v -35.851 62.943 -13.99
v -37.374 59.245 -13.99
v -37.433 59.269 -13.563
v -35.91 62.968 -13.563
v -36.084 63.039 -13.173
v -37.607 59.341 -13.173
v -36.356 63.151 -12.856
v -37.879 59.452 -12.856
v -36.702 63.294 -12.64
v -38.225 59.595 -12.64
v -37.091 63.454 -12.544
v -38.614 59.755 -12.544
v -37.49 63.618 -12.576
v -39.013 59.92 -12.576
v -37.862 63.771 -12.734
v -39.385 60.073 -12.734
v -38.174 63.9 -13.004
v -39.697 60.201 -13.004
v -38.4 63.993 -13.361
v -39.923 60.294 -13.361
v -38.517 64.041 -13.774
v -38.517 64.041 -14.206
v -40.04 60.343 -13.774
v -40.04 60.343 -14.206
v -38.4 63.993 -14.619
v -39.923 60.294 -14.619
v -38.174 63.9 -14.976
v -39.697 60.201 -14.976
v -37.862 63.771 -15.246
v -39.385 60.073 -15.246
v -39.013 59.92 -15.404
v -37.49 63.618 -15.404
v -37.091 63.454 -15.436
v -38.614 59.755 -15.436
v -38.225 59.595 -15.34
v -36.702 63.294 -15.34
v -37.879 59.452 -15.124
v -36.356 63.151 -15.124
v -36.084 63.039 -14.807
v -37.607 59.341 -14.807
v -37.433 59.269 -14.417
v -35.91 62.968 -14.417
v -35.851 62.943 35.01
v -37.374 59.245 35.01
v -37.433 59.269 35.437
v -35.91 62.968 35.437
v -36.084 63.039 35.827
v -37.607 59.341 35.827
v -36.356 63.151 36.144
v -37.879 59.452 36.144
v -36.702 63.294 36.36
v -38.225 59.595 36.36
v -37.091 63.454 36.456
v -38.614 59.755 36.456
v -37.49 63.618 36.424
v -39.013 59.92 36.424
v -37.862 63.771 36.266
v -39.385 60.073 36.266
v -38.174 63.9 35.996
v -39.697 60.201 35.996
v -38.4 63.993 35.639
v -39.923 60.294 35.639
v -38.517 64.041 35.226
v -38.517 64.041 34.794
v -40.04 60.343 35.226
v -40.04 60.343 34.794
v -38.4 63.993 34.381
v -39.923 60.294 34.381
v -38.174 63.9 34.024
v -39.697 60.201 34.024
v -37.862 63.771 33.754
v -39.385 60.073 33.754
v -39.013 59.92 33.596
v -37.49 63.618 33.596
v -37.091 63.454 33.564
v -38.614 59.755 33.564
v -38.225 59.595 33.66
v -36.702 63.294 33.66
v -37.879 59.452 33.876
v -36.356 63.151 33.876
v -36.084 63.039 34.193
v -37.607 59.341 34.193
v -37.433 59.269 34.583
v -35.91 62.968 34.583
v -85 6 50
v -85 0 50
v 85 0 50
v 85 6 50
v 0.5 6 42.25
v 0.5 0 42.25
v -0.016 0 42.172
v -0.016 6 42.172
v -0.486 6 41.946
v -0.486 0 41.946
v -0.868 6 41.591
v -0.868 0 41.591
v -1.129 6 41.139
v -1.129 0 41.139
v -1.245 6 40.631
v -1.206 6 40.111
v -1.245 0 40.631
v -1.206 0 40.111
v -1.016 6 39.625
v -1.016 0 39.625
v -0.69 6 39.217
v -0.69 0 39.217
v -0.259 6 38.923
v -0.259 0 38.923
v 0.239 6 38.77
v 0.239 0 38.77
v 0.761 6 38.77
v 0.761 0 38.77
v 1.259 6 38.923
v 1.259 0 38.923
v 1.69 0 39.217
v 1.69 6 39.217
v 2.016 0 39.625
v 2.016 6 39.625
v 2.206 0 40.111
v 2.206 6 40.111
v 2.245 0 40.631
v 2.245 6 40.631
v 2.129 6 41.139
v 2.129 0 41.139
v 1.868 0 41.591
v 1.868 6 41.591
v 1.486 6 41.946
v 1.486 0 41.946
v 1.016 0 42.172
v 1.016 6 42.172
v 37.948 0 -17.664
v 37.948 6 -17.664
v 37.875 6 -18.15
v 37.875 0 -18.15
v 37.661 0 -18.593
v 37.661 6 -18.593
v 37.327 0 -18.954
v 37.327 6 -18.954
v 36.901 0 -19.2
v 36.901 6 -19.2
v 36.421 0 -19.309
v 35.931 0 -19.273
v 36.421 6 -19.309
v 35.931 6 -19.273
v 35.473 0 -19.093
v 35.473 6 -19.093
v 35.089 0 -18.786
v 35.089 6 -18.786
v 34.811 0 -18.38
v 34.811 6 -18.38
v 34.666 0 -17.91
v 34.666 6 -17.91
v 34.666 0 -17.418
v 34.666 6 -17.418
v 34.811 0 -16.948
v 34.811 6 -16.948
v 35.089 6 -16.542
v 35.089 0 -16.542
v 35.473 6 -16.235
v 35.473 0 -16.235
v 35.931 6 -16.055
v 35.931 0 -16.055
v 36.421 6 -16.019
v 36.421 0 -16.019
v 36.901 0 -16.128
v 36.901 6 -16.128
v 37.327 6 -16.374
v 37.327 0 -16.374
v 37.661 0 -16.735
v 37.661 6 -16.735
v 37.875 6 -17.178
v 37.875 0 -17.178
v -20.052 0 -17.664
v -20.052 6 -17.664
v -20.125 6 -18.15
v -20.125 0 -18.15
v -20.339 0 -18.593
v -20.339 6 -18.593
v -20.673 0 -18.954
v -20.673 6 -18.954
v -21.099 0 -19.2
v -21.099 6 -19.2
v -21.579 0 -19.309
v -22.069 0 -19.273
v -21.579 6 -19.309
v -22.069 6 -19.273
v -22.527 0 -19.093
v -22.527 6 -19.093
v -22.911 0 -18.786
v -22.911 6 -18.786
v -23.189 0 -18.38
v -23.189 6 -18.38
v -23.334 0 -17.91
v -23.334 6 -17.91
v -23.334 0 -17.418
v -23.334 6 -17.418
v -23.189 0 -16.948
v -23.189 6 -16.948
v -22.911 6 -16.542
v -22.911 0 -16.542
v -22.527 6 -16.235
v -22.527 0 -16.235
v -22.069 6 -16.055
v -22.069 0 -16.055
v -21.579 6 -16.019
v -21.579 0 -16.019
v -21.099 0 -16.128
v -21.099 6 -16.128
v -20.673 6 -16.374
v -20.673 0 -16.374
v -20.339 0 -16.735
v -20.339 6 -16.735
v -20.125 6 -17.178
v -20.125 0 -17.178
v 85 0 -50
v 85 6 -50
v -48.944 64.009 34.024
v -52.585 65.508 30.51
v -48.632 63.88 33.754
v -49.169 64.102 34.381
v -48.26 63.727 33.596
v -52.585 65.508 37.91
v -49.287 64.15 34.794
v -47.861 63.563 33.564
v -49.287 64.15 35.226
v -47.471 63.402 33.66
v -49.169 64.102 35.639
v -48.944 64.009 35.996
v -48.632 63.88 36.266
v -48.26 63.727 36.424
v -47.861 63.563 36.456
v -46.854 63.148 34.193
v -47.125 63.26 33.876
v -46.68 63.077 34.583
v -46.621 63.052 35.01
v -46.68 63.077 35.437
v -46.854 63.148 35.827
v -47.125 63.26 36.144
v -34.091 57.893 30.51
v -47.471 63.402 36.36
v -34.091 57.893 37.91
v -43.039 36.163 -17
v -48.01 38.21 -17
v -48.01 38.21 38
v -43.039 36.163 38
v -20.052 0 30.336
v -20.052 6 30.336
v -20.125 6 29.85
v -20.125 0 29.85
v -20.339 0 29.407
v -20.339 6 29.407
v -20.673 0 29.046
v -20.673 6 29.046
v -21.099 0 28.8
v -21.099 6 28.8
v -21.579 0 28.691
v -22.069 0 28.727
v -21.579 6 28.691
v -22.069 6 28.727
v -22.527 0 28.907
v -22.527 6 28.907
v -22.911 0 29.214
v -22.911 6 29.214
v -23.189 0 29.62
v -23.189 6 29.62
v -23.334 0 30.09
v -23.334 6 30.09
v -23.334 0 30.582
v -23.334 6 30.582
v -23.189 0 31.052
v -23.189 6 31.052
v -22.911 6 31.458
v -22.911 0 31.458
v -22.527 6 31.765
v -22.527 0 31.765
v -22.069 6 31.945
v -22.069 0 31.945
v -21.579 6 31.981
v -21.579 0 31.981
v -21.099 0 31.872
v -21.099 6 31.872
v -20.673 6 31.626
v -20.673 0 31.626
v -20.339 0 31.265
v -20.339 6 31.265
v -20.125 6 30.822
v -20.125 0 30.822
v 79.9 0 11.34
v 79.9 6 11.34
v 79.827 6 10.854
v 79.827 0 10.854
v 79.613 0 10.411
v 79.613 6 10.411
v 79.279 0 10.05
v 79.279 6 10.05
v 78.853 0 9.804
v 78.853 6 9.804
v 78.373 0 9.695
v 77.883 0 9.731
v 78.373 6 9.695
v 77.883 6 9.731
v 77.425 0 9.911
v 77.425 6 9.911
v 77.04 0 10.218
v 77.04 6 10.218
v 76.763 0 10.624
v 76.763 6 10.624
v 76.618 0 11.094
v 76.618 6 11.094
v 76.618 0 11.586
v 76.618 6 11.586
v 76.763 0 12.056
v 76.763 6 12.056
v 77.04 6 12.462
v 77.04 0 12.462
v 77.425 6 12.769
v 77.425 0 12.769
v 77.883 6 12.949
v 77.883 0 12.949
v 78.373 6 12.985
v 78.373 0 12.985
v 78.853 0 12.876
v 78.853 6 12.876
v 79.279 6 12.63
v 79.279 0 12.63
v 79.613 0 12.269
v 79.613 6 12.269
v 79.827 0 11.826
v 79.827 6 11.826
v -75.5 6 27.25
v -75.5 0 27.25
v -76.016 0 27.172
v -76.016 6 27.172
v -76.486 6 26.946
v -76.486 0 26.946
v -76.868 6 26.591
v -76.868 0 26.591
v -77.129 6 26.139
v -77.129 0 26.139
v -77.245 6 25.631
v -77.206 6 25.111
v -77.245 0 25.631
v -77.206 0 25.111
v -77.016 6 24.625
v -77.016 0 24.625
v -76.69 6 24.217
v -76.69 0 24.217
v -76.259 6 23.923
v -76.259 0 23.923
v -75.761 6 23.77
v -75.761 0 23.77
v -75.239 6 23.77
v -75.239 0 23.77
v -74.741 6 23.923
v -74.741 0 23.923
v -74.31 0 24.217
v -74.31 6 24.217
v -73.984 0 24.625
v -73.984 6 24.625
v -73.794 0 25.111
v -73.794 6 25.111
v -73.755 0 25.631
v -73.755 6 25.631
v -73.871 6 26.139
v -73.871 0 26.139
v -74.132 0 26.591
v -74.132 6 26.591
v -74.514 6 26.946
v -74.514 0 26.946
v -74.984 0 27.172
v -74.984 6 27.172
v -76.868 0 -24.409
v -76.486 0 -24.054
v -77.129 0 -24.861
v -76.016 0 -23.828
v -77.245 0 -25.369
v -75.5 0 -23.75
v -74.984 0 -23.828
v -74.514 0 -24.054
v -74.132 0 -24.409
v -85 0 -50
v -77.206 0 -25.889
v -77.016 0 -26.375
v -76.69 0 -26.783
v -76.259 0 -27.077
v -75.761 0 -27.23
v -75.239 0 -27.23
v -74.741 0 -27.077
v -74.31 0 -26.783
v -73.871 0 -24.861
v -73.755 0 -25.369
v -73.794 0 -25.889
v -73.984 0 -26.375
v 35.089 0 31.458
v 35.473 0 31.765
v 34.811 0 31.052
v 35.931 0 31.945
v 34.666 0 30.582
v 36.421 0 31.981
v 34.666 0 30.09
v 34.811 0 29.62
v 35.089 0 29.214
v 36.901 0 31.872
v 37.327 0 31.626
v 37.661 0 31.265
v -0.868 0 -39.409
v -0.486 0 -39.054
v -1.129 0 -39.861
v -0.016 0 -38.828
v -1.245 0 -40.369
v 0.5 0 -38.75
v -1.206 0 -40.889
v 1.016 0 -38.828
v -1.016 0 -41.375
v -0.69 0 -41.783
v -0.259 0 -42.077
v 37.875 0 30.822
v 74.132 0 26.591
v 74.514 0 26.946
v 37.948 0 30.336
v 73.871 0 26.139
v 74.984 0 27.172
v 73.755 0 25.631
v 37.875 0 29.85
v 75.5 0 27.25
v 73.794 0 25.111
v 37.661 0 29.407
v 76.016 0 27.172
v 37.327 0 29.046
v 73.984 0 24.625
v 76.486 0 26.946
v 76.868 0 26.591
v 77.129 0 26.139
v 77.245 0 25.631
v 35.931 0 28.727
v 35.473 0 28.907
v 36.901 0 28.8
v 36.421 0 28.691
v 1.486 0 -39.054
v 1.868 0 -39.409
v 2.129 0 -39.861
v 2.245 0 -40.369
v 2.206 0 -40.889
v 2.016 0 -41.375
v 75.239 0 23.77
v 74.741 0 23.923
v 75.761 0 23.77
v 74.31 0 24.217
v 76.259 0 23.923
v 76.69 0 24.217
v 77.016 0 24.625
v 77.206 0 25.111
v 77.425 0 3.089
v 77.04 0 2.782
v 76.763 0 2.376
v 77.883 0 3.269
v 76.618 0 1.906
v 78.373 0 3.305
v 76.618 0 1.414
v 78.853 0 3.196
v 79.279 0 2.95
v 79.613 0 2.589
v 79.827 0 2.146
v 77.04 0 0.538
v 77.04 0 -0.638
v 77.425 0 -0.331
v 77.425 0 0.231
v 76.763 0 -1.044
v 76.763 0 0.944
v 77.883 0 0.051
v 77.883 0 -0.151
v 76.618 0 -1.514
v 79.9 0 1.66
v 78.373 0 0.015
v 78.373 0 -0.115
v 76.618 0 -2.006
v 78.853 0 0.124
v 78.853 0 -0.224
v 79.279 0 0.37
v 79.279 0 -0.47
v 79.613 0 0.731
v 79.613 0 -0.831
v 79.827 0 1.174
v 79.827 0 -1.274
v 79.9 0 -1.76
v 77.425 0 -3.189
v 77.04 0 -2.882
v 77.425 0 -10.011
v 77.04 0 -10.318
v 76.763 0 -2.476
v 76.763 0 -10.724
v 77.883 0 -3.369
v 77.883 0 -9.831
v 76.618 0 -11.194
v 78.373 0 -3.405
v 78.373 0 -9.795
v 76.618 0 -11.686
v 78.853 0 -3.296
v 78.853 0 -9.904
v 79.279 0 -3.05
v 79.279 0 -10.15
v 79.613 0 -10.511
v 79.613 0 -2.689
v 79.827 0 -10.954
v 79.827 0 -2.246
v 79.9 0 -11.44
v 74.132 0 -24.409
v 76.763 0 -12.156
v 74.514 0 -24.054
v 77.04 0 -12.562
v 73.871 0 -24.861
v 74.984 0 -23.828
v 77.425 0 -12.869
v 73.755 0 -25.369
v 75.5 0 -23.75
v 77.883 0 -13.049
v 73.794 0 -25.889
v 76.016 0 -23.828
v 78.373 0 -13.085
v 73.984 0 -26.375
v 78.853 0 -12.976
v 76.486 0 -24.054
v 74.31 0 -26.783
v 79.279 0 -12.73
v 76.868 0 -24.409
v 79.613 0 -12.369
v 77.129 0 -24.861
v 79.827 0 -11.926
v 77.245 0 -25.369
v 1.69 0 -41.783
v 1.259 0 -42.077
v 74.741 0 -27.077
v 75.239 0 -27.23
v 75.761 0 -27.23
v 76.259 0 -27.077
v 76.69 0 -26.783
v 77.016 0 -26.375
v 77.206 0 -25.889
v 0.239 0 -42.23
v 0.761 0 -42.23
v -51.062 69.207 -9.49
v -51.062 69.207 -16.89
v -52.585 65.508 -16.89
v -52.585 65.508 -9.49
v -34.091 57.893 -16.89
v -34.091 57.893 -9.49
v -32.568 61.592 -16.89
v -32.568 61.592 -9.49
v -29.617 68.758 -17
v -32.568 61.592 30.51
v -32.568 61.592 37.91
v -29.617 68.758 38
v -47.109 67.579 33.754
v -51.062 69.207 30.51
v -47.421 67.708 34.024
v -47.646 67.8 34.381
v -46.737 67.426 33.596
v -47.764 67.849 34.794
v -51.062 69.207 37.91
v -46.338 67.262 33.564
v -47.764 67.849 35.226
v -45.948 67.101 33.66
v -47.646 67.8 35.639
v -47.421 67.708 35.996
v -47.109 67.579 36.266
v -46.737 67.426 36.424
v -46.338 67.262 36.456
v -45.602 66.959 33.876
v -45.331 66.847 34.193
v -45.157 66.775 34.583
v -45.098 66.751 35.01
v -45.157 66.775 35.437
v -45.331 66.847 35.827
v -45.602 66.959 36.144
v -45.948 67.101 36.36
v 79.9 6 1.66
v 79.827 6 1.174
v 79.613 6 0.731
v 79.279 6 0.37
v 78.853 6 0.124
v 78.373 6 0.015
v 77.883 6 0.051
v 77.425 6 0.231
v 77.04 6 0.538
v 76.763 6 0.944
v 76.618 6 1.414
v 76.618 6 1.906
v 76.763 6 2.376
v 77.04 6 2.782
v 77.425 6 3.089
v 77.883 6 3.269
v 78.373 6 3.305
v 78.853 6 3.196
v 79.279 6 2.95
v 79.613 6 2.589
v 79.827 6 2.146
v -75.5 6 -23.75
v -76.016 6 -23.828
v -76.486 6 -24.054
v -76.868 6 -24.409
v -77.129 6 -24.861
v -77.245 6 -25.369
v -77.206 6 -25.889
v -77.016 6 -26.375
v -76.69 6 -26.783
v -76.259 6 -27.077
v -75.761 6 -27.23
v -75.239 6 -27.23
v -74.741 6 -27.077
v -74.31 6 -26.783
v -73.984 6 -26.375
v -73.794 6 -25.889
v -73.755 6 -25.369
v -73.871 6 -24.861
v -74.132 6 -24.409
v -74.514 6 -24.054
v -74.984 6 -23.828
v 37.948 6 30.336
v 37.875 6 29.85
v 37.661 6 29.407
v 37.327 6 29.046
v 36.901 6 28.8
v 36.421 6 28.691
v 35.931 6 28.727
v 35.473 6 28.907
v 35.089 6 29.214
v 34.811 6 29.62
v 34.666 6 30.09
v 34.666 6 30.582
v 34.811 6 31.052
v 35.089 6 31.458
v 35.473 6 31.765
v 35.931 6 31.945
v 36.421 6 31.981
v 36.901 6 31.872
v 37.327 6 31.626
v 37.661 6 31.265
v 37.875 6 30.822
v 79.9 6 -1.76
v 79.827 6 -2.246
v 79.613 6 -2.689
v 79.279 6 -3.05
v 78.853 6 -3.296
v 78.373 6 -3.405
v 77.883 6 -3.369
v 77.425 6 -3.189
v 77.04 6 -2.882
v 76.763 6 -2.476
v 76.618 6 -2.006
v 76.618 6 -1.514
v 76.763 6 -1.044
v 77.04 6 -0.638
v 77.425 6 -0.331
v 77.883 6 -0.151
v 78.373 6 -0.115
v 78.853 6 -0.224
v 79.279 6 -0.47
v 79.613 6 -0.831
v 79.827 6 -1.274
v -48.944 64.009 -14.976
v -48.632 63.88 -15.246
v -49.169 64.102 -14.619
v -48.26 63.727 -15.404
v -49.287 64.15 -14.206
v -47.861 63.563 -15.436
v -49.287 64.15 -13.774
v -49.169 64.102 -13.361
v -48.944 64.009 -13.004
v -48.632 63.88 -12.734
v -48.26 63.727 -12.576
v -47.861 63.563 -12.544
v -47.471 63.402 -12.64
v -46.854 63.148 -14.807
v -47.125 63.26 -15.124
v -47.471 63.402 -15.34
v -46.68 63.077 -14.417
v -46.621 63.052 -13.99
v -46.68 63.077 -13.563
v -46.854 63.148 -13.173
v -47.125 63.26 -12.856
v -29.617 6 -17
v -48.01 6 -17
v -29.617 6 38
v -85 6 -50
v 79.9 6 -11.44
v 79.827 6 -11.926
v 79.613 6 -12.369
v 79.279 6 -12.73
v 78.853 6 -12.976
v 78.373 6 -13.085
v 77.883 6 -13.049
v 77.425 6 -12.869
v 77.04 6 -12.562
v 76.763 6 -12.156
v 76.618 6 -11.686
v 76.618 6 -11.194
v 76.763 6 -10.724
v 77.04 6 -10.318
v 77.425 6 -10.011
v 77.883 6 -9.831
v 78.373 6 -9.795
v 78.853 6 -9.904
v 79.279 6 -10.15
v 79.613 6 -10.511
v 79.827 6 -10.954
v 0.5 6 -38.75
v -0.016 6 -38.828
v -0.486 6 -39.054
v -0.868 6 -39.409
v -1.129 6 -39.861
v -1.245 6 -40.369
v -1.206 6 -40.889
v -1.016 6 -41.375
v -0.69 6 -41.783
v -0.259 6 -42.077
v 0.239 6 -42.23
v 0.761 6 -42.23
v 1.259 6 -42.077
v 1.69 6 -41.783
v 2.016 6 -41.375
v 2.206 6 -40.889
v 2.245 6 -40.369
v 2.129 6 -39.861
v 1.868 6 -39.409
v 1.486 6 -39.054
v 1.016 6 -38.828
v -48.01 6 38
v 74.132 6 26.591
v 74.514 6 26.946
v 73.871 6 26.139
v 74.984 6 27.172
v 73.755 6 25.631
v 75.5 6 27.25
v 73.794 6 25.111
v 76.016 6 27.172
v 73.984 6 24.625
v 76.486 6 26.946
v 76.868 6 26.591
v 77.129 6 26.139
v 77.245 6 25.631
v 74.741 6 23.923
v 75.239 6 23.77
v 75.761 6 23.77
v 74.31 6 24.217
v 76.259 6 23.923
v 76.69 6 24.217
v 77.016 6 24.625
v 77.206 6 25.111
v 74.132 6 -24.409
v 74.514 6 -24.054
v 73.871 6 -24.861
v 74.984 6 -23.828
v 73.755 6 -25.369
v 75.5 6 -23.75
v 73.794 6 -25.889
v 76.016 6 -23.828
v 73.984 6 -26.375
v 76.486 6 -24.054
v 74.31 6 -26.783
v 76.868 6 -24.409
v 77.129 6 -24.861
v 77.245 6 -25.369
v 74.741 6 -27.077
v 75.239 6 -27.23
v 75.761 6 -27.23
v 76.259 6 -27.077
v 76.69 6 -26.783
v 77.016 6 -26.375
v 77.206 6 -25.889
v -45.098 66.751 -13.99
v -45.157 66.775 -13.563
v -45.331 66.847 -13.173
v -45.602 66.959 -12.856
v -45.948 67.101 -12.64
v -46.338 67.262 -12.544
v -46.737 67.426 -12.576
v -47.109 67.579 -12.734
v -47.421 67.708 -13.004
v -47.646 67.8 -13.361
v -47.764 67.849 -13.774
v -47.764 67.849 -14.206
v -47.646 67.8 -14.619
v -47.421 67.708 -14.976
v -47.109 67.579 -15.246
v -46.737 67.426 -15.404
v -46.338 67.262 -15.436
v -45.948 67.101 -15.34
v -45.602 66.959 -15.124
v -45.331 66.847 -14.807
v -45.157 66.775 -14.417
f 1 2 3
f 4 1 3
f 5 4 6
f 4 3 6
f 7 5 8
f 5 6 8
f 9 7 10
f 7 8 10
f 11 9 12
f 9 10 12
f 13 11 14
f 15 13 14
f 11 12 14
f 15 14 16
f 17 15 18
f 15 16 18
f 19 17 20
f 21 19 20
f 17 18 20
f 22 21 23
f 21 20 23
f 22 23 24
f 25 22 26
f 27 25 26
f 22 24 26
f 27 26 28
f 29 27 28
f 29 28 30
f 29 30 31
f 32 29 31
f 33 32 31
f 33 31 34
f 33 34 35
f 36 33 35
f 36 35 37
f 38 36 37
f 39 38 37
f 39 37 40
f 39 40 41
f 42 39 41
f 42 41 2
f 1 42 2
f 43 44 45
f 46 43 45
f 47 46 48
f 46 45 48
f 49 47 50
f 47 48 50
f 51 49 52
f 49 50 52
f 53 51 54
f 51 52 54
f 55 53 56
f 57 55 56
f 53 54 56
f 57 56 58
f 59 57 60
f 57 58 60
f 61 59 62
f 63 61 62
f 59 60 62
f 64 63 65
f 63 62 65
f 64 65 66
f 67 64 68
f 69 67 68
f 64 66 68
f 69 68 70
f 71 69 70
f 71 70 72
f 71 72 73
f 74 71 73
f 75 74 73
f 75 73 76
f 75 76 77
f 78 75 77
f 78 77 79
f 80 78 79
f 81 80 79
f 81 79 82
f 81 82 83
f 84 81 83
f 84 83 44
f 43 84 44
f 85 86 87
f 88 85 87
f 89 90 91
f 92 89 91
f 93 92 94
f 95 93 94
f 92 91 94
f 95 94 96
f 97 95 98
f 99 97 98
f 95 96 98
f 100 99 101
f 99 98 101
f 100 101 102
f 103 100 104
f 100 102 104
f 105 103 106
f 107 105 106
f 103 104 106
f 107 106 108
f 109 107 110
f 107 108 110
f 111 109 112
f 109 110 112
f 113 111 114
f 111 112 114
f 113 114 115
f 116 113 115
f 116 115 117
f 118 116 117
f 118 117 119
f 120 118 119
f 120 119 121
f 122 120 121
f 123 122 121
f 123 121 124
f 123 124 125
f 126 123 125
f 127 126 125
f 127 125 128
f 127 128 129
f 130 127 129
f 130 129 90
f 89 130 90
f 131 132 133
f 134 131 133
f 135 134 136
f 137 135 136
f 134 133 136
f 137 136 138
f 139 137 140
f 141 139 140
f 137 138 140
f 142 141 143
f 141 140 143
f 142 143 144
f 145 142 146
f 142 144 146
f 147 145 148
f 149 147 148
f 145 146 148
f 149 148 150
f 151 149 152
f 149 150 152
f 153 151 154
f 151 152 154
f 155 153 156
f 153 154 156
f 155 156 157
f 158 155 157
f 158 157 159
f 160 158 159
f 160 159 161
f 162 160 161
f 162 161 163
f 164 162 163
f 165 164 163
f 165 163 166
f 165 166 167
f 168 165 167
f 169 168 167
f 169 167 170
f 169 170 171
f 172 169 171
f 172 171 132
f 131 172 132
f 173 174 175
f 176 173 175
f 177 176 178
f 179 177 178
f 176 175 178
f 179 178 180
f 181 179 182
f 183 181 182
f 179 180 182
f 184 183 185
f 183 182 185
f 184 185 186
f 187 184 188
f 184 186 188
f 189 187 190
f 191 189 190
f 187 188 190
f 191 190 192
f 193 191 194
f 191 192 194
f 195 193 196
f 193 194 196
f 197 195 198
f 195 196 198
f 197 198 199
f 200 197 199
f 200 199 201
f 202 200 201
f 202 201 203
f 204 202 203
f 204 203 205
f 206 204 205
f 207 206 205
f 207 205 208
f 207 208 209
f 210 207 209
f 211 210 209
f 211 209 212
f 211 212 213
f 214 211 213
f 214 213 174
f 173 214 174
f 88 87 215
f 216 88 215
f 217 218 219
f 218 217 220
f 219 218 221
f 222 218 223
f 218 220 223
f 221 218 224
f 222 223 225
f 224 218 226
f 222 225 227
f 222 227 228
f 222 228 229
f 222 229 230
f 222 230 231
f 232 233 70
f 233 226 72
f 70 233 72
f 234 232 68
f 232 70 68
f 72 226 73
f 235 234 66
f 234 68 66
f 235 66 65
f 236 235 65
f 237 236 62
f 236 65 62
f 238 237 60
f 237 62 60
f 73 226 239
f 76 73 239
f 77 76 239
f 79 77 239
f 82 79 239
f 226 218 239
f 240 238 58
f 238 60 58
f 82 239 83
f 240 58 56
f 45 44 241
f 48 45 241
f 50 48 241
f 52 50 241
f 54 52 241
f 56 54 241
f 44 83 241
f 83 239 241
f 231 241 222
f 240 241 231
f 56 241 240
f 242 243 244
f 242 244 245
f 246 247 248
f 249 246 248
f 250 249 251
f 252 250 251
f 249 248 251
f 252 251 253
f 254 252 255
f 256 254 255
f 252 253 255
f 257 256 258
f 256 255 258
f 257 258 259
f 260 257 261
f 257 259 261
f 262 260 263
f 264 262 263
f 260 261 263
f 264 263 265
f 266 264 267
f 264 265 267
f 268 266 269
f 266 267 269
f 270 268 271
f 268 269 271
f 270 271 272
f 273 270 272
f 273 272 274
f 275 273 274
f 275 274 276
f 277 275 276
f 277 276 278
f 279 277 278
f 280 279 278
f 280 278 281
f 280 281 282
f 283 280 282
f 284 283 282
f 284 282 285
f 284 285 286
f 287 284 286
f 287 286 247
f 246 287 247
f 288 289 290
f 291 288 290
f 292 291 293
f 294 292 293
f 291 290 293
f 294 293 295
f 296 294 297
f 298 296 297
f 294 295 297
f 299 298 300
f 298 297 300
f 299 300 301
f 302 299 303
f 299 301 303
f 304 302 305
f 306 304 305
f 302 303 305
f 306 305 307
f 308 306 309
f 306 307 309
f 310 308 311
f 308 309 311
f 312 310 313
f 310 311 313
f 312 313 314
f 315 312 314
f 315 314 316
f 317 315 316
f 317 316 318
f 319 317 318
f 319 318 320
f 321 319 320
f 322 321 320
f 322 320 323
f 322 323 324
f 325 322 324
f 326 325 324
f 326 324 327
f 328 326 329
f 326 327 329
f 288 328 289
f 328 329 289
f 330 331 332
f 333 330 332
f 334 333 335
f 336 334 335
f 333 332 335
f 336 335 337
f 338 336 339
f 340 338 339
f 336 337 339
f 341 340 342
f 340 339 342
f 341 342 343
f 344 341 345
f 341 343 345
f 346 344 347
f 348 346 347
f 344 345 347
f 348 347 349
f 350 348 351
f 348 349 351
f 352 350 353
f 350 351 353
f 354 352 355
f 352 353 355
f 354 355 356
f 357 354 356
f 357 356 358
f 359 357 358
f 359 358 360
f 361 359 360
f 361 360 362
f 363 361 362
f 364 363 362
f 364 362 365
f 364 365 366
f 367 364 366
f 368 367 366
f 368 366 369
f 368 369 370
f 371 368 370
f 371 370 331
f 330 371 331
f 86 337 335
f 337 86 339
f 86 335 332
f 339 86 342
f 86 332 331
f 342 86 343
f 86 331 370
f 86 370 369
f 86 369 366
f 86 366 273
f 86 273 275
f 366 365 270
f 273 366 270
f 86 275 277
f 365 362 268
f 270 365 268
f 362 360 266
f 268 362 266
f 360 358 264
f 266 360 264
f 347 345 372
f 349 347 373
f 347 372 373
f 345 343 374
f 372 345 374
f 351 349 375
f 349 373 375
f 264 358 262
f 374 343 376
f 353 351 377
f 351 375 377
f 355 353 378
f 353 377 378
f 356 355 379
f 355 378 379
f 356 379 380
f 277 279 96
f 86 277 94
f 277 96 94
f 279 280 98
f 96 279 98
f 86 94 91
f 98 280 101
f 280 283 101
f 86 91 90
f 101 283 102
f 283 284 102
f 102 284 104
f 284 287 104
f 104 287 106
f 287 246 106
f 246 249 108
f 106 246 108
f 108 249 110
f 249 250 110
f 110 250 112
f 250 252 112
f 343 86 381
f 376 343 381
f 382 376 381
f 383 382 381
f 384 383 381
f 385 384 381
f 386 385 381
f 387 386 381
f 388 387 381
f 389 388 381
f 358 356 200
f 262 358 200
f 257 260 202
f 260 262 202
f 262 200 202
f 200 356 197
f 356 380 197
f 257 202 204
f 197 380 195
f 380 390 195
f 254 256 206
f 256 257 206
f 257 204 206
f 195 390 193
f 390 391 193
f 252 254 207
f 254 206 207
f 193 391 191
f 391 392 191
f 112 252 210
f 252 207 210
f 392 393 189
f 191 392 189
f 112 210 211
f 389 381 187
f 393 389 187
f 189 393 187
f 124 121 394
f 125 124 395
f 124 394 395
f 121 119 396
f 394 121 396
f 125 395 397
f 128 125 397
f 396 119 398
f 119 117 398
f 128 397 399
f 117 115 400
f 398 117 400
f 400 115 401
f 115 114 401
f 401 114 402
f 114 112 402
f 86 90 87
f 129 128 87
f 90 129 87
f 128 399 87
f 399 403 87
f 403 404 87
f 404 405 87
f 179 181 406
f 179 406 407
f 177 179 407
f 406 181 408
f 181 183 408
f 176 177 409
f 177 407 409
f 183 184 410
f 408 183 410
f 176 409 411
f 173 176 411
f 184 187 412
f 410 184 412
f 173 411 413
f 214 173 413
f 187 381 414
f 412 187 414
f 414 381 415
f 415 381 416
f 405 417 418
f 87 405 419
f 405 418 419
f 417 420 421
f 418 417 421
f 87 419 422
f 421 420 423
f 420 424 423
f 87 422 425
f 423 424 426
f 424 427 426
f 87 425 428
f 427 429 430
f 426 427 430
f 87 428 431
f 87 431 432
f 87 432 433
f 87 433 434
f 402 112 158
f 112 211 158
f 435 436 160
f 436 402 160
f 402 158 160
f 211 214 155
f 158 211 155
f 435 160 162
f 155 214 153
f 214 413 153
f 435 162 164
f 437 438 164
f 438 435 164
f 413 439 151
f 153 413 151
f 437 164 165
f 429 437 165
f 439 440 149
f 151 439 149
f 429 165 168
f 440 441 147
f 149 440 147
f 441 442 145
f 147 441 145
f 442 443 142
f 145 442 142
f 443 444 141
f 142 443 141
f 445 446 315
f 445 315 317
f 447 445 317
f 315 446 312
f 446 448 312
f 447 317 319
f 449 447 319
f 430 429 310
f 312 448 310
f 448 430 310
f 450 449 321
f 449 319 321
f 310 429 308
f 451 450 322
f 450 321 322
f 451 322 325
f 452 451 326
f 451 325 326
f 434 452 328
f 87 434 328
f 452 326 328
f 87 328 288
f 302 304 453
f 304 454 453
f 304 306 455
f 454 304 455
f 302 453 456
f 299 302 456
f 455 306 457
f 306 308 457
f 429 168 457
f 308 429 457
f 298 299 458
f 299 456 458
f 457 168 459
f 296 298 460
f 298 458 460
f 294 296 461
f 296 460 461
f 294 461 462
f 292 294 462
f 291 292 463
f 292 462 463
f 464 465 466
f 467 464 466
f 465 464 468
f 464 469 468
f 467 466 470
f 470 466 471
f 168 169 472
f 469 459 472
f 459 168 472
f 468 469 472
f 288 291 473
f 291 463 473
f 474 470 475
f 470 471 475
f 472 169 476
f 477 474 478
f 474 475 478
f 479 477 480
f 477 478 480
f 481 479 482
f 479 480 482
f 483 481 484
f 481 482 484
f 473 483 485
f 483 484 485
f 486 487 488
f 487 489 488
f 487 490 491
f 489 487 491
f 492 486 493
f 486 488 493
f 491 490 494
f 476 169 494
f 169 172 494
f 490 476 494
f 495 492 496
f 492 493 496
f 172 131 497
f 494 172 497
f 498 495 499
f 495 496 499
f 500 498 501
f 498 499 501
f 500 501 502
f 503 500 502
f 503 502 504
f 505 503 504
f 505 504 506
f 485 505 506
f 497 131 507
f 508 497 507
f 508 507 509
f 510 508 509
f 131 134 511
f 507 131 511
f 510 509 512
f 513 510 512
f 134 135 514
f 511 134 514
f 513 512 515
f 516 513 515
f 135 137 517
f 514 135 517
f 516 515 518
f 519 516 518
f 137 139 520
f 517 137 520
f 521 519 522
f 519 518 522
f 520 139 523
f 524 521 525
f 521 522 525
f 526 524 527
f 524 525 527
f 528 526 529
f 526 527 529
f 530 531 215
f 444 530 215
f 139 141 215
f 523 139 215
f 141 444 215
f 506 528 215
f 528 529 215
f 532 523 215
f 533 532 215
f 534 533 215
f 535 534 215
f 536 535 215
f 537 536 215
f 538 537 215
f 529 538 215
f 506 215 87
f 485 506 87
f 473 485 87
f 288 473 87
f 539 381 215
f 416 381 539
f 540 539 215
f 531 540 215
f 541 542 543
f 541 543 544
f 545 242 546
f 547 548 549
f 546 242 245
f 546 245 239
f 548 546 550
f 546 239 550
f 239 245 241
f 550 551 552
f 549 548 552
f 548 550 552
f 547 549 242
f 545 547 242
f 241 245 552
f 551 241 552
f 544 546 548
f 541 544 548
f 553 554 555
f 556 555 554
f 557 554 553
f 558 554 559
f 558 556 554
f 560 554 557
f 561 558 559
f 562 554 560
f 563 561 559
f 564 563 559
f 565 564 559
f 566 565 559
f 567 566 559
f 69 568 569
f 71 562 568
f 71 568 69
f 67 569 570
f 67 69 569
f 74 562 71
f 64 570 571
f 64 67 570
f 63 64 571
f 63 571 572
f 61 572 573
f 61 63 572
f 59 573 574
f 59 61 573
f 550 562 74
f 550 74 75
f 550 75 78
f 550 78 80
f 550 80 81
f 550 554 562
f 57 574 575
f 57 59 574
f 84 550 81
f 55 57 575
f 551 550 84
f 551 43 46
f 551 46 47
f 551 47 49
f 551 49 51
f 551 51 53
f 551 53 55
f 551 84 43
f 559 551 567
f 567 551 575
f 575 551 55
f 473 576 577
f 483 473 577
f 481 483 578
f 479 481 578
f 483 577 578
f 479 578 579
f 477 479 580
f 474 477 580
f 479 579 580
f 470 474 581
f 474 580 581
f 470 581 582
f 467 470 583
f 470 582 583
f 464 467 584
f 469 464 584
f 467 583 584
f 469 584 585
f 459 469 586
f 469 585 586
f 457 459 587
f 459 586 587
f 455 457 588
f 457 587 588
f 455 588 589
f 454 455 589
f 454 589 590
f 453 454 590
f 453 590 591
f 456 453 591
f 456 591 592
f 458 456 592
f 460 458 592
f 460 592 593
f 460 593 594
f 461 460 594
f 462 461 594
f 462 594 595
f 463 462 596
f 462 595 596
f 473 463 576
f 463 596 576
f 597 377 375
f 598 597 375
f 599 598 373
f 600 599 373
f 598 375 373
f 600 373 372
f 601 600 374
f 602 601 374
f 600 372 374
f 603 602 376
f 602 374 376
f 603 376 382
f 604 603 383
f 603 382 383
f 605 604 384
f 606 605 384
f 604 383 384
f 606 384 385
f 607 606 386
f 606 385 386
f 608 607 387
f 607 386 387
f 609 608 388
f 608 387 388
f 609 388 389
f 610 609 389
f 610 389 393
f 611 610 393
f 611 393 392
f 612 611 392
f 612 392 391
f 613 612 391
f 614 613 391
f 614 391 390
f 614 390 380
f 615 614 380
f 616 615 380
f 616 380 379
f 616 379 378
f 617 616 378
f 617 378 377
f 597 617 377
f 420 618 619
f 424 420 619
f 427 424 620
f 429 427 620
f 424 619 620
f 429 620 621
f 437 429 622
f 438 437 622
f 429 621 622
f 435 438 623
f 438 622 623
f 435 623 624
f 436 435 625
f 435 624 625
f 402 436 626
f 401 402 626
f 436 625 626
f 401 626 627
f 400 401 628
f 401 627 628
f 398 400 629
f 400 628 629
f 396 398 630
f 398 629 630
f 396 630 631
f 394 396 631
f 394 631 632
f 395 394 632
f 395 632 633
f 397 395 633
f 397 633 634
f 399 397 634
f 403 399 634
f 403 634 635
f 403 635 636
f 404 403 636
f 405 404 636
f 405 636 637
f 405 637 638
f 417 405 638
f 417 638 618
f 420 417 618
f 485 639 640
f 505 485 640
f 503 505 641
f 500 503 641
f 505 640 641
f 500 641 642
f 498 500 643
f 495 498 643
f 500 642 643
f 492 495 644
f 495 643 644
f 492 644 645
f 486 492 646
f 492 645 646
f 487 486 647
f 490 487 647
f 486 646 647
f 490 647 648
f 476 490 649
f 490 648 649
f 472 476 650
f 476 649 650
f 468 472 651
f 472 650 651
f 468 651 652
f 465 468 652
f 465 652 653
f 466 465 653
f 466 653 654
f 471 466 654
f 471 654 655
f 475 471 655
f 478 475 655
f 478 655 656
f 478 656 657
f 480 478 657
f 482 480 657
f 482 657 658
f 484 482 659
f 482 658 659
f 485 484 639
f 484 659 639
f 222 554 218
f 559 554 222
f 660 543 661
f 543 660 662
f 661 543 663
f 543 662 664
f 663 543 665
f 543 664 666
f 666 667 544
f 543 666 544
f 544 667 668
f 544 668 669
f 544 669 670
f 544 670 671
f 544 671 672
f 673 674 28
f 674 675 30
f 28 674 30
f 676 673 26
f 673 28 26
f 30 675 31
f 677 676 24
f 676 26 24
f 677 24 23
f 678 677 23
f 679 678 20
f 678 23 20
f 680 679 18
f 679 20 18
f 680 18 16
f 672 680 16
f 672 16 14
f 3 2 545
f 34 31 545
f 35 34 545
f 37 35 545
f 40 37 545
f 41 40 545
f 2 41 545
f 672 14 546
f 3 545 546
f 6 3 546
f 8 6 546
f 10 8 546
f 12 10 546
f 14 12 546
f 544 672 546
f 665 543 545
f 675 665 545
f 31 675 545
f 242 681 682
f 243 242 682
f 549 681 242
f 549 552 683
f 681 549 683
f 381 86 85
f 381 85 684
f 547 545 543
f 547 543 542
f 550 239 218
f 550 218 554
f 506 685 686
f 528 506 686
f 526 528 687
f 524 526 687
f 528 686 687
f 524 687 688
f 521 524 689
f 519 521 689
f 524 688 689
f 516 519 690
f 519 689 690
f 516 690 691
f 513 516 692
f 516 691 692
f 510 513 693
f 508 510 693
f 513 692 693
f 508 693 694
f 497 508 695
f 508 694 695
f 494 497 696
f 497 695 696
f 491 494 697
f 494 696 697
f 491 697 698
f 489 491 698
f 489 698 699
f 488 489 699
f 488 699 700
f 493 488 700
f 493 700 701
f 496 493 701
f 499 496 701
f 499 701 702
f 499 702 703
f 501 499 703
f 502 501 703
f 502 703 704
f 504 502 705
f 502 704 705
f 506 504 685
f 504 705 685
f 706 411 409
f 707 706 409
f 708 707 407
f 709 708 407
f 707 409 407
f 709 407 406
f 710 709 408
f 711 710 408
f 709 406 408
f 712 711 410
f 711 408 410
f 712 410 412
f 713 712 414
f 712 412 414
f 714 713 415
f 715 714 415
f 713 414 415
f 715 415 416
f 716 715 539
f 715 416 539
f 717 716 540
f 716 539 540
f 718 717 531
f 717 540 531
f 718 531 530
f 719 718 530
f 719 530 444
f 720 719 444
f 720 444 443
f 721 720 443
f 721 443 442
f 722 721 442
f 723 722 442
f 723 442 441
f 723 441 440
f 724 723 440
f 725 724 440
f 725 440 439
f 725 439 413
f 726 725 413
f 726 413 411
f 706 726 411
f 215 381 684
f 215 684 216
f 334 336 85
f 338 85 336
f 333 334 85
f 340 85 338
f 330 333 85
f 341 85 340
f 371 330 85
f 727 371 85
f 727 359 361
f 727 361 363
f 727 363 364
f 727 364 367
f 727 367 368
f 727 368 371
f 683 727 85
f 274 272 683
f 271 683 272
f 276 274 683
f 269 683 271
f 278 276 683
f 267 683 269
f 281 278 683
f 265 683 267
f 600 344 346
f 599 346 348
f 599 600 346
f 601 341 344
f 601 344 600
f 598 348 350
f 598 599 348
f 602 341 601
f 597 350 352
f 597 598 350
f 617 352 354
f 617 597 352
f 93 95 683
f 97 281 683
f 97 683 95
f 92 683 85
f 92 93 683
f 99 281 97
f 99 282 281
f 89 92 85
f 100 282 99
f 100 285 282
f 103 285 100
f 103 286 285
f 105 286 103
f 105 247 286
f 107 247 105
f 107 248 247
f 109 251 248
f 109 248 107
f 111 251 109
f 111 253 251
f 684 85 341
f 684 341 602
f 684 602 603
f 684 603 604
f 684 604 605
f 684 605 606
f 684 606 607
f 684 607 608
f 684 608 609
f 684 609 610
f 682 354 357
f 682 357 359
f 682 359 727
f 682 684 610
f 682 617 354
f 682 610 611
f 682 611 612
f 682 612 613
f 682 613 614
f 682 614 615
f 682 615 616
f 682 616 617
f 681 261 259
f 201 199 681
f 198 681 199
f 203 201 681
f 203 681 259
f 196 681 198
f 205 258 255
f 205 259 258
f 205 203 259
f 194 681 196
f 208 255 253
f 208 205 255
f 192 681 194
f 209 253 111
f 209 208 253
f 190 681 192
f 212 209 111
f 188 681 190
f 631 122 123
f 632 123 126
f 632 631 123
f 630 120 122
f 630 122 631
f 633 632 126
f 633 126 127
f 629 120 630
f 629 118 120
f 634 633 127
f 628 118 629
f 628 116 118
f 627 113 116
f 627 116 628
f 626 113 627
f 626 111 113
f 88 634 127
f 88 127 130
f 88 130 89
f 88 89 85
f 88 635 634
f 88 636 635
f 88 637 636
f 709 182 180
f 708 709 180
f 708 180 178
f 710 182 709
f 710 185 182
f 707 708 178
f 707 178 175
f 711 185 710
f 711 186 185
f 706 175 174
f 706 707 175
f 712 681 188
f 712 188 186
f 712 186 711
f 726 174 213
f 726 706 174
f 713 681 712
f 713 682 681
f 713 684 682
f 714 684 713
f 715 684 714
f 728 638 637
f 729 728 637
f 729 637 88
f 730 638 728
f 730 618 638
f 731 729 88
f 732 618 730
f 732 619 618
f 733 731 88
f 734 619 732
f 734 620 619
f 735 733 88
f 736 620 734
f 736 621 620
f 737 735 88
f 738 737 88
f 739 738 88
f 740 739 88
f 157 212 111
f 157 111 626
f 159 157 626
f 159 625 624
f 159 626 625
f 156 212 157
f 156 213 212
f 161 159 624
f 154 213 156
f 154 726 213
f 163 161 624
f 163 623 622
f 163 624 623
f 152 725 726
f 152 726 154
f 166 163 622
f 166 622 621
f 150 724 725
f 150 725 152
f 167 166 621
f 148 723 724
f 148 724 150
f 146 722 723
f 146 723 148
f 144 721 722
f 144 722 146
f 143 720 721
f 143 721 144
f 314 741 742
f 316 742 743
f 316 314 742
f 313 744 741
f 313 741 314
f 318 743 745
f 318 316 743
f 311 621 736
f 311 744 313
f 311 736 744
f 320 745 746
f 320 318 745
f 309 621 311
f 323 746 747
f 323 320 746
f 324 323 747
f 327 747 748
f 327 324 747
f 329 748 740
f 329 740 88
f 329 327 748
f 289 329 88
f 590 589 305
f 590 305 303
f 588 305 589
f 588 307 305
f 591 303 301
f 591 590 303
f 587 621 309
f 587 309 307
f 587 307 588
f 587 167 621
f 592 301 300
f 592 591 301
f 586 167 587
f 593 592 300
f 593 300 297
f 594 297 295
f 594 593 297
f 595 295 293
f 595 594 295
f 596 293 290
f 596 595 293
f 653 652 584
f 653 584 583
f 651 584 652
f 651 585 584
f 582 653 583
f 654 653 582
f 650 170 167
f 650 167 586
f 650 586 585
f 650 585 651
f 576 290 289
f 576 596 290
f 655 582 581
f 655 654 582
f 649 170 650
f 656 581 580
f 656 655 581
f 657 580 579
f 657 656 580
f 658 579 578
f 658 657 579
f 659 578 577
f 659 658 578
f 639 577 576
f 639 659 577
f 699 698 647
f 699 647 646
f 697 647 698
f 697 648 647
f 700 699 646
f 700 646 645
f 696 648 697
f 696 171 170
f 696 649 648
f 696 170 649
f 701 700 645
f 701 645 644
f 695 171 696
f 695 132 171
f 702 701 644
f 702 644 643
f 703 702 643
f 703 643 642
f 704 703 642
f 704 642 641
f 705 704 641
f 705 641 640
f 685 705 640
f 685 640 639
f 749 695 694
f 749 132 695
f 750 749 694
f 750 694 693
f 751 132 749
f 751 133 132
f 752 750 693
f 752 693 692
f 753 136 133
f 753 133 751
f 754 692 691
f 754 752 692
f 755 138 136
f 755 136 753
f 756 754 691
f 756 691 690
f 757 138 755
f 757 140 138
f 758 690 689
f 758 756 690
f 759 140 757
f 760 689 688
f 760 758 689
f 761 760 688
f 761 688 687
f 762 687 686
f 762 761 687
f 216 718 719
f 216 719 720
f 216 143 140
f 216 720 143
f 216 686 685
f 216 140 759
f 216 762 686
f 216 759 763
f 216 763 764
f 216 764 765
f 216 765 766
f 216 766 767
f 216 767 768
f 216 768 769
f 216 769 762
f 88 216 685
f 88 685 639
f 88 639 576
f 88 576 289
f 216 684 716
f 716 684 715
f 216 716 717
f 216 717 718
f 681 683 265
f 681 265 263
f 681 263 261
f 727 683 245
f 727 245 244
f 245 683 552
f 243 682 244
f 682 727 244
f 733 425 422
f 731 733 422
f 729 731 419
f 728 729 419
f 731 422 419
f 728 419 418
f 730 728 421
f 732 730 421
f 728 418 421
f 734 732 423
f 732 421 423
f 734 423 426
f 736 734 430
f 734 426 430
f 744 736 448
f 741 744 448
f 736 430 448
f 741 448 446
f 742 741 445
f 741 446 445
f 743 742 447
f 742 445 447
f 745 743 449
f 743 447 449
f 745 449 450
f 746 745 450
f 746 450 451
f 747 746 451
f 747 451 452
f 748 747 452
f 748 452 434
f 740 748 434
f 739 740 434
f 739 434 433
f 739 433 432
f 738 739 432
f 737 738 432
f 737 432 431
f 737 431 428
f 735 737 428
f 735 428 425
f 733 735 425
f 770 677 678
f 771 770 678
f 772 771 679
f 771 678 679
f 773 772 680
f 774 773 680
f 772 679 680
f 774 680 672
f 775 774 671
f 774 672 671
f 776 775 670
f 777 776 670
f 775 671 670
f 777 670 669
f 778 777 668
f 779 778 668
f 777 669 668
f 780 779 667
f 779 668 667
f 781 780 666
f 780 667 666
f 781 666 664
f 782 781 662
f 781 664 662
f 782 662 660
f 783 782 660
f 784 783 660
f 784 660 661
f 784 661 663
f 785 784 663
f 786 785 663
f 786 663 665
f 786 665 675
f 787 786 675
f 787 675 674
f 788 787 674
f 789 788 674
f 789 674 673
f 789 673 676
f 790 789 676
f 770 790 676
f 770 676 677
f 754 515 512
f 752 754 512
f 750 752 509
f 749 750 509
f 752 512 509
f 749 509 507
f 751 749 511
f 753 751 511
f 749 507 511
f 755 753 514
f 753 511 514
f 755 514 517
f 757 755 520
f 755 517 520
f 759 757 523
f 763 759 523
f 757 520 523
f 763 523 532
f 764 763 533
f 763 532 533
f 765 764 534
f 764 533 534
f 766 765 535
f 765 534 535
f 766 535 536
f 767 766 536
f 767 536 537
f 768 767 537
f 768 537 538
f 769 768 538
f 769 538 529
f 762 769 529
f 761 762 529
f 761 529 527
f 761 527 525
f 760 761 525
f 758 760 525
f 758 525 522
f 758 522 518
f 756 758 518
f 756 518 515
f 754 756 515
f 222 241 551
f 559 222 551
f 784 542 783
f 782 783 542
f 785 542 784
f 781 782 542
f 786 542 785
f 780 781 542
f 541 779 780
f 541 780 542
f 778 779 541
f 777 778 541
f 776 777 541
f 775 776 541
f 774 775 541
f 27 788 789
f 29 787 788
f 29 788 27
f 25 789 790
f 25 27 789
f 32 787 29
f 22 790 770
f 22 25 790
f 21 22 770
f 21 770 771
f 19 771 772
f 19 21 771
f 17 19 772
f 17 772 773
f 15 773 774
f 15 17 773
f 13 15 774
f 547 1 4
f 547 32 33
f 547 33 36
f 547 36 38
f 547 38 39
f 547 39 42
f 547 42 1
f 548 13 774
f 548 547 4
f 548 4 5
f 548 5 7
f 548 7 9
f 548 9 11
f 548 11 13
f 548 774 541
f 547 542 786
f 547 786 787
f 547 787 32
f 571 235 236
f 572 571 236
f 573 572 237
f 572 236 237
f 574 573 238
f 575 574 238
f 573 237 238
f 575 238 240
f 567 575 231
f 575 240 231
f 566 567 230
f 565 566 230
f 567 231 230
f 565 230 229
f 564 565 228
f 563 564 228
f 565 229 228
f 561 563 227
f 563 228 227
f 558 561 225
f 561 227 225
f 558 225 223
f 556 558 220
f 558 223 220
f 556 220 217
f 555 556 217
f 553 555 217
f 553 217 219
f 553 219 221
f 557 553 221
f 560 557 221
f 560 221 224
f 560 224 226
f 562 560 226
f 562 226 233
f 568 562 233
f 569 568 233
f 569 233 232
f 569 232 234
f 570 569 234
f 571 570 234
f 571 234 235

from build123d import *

# Parameters (mm, degrees)
SKETCH1_W                = 170
SKETCH1_H                = 100
BOSS_EXTRUDE1_DEPTH      = 6
BOSS_EXTRUDE2_DEPTH      = 38
BOSS_EXTRUDE2_DEPTH_BACK = 17
SKETCH3_W                = 7.4
SKETCH3_H                = 4
BOSS_EXTRUDE3_DEPTH      = 20
SKETCH5_R                = 1.45
CUT_EXTRUDE1_DEPTH       = 10
SKETCH6_R                = 1.75
CUT_EXTRUDE2_DEPTH       = 20
SKETCH7_R                = 1.65
CUT_EXTRUDE3_DEPTH       = 10
SKETCH9_R                = 1.65
CUT_EXTRUDE6_DEPTH       = 6


with BuildPart() as part:
    # Sketch1 → Boss-Extrude1 (new body)
    with BuildSketch(Plane(origin=(0, 0, 0), x_dir=(1, 0, 0), z_dir=(0, 1, 0))):
        Rectangle(SKETCH1_W, SKETCH1_H)
    extrude(amount=BOSS_EXTRUDE1_DEPTH)

    # Sketch2 → Boss-Extrude2 (add, two sides)
    with BuildSketch(Plane.XY) as boss_extrude2_sk:
        Polygon((-29.617343581, 68.757920077), (-29.617343581, 6), (-48.010328849, 6), (-48.010328849, 38.210127837), (-43.038774216, 36.163017106), align=None)
    extrude(amount=BOSS_EXTRUDE2_DEPTH)
    extrude(boss_extrude2_sk.sketch, amount=-BOSS_EXTRUDE2_DEPTH_BACK)

    # Sketch3 → Boss-Extrude3 (add)
    with BuildSketch(Plane(origin=(-49.531375101, 20.3952721, 0), x_dir=(0, 0, 1), z_dir=(-0.924678098, 0.380749805, 0))):
        with Locations((34.210001, 42.552144992)):
            Rectangle(SKETCH3_W, SKETCH3_H)
        with Locations((-13.189999, 42.552144992)):
            Rectangle(SKETCH3_W, SKETCH3_H)
    extrude(amount=BOSS_EXTRUDE3_DEPTH)

    # Sketch5 → Cut-Extrude1 (cut)
    with BuildSketch(Plane(origin=(15.440221308, 37.49768032, 0), x_dir=(0.924678098, -0.380749805, 0), z_dir=(-0.380749805, -0.924678098, 0))):
        with Locations((-68.566073623, -13.989999)):
            Circle(SKETCH5_R)
        with Locations((-68.566073623, 35.010001)):
            Circle(SKETCH5_R)
        with Locations((-58.566073623, 35.010001)):
            Circle(SKETCH5_R)
        with Locations((-58.566073623, -13.989999)):
            Circle(SKETCH5_R)
    extrude(amount=-CUT_EXTRUDE1_DEPTH, mode=Mode.SUBTRACT)

    # Sketch6 → Cut-Extrude2 (cut)
    with BuildSketch(Plane(origin=(145.967078426, 0, -60.767513946), x_dir=(0, 0, 1), z_dir=(0, -1, 0))):
        with Locations((35.267513946, 221.467078426)):
            Circle(SKETCH6_R)
        with Locations((86.267513946, 221.467078426)):
            Circle(SKETCH6_R)
        with Locations((101.267513946, 145.467078426)):
            Circle(SKETCH6_R)
        with Locations((20.267513946, 145.467078426)):
            Circle(SKETCH6_R)
        with Locations((35.267513946, 70.467078426)):
            Circle(SKETCH6_R)
        with Locations((86.267513946, 70.467078426)):
            Circle(SKETCH6_R)
    extrude(amount=-CUT_EXTRUDE2_DEPTH, mode=Mode.SUBTRACT)

    # Sketch7 → Cut-Extrude3 (cut)
    with BuildSketch(Plane(origin=(0, 6, 0), x_dir=(1, 0, 0), z_dir=(0, 1, 0))):
        with Locations((36.298055455, -30.335990453)):
            Circle(SKETCH7_R)
        with Locations((36.298055455, 17.664009547)):
            Circle(SKETCH7_R)
        with Locations((-21.701944545, 17.664009547)):
            Circle(SKETCH7_R)
        with Locations((-21.701944545, -30.335990453)):
            Circle(SKETCH7_R)
    extrude(amount=-CUT_EXTRUDE3_DEPTH, mode=Mode.SUBTRACT)

    # Sketch9 → Cut-Extrude6 (cut)
    with BuildSketch(Plane(origin=(0, 6, 0), x_dir=(1, 0, 0), z_dir=(0, 1, 0))):
        with Locations((78.25, -11.34)):
            Circle(SKETCH9_R)
        with Locations((78.25, 1.76)):
            Circle(SKETCH9_R)
        with Locations((78.25, 11.44)):
            Circle(SKETCH9_R)
        with Locations((78.25, -1.66)):
            Circle(SKETCH9_R)
    extrude(amount=-CUT_EXTRUDE6_DEPTH, mode=Mode.SUBTRACT)


solid = part.part
